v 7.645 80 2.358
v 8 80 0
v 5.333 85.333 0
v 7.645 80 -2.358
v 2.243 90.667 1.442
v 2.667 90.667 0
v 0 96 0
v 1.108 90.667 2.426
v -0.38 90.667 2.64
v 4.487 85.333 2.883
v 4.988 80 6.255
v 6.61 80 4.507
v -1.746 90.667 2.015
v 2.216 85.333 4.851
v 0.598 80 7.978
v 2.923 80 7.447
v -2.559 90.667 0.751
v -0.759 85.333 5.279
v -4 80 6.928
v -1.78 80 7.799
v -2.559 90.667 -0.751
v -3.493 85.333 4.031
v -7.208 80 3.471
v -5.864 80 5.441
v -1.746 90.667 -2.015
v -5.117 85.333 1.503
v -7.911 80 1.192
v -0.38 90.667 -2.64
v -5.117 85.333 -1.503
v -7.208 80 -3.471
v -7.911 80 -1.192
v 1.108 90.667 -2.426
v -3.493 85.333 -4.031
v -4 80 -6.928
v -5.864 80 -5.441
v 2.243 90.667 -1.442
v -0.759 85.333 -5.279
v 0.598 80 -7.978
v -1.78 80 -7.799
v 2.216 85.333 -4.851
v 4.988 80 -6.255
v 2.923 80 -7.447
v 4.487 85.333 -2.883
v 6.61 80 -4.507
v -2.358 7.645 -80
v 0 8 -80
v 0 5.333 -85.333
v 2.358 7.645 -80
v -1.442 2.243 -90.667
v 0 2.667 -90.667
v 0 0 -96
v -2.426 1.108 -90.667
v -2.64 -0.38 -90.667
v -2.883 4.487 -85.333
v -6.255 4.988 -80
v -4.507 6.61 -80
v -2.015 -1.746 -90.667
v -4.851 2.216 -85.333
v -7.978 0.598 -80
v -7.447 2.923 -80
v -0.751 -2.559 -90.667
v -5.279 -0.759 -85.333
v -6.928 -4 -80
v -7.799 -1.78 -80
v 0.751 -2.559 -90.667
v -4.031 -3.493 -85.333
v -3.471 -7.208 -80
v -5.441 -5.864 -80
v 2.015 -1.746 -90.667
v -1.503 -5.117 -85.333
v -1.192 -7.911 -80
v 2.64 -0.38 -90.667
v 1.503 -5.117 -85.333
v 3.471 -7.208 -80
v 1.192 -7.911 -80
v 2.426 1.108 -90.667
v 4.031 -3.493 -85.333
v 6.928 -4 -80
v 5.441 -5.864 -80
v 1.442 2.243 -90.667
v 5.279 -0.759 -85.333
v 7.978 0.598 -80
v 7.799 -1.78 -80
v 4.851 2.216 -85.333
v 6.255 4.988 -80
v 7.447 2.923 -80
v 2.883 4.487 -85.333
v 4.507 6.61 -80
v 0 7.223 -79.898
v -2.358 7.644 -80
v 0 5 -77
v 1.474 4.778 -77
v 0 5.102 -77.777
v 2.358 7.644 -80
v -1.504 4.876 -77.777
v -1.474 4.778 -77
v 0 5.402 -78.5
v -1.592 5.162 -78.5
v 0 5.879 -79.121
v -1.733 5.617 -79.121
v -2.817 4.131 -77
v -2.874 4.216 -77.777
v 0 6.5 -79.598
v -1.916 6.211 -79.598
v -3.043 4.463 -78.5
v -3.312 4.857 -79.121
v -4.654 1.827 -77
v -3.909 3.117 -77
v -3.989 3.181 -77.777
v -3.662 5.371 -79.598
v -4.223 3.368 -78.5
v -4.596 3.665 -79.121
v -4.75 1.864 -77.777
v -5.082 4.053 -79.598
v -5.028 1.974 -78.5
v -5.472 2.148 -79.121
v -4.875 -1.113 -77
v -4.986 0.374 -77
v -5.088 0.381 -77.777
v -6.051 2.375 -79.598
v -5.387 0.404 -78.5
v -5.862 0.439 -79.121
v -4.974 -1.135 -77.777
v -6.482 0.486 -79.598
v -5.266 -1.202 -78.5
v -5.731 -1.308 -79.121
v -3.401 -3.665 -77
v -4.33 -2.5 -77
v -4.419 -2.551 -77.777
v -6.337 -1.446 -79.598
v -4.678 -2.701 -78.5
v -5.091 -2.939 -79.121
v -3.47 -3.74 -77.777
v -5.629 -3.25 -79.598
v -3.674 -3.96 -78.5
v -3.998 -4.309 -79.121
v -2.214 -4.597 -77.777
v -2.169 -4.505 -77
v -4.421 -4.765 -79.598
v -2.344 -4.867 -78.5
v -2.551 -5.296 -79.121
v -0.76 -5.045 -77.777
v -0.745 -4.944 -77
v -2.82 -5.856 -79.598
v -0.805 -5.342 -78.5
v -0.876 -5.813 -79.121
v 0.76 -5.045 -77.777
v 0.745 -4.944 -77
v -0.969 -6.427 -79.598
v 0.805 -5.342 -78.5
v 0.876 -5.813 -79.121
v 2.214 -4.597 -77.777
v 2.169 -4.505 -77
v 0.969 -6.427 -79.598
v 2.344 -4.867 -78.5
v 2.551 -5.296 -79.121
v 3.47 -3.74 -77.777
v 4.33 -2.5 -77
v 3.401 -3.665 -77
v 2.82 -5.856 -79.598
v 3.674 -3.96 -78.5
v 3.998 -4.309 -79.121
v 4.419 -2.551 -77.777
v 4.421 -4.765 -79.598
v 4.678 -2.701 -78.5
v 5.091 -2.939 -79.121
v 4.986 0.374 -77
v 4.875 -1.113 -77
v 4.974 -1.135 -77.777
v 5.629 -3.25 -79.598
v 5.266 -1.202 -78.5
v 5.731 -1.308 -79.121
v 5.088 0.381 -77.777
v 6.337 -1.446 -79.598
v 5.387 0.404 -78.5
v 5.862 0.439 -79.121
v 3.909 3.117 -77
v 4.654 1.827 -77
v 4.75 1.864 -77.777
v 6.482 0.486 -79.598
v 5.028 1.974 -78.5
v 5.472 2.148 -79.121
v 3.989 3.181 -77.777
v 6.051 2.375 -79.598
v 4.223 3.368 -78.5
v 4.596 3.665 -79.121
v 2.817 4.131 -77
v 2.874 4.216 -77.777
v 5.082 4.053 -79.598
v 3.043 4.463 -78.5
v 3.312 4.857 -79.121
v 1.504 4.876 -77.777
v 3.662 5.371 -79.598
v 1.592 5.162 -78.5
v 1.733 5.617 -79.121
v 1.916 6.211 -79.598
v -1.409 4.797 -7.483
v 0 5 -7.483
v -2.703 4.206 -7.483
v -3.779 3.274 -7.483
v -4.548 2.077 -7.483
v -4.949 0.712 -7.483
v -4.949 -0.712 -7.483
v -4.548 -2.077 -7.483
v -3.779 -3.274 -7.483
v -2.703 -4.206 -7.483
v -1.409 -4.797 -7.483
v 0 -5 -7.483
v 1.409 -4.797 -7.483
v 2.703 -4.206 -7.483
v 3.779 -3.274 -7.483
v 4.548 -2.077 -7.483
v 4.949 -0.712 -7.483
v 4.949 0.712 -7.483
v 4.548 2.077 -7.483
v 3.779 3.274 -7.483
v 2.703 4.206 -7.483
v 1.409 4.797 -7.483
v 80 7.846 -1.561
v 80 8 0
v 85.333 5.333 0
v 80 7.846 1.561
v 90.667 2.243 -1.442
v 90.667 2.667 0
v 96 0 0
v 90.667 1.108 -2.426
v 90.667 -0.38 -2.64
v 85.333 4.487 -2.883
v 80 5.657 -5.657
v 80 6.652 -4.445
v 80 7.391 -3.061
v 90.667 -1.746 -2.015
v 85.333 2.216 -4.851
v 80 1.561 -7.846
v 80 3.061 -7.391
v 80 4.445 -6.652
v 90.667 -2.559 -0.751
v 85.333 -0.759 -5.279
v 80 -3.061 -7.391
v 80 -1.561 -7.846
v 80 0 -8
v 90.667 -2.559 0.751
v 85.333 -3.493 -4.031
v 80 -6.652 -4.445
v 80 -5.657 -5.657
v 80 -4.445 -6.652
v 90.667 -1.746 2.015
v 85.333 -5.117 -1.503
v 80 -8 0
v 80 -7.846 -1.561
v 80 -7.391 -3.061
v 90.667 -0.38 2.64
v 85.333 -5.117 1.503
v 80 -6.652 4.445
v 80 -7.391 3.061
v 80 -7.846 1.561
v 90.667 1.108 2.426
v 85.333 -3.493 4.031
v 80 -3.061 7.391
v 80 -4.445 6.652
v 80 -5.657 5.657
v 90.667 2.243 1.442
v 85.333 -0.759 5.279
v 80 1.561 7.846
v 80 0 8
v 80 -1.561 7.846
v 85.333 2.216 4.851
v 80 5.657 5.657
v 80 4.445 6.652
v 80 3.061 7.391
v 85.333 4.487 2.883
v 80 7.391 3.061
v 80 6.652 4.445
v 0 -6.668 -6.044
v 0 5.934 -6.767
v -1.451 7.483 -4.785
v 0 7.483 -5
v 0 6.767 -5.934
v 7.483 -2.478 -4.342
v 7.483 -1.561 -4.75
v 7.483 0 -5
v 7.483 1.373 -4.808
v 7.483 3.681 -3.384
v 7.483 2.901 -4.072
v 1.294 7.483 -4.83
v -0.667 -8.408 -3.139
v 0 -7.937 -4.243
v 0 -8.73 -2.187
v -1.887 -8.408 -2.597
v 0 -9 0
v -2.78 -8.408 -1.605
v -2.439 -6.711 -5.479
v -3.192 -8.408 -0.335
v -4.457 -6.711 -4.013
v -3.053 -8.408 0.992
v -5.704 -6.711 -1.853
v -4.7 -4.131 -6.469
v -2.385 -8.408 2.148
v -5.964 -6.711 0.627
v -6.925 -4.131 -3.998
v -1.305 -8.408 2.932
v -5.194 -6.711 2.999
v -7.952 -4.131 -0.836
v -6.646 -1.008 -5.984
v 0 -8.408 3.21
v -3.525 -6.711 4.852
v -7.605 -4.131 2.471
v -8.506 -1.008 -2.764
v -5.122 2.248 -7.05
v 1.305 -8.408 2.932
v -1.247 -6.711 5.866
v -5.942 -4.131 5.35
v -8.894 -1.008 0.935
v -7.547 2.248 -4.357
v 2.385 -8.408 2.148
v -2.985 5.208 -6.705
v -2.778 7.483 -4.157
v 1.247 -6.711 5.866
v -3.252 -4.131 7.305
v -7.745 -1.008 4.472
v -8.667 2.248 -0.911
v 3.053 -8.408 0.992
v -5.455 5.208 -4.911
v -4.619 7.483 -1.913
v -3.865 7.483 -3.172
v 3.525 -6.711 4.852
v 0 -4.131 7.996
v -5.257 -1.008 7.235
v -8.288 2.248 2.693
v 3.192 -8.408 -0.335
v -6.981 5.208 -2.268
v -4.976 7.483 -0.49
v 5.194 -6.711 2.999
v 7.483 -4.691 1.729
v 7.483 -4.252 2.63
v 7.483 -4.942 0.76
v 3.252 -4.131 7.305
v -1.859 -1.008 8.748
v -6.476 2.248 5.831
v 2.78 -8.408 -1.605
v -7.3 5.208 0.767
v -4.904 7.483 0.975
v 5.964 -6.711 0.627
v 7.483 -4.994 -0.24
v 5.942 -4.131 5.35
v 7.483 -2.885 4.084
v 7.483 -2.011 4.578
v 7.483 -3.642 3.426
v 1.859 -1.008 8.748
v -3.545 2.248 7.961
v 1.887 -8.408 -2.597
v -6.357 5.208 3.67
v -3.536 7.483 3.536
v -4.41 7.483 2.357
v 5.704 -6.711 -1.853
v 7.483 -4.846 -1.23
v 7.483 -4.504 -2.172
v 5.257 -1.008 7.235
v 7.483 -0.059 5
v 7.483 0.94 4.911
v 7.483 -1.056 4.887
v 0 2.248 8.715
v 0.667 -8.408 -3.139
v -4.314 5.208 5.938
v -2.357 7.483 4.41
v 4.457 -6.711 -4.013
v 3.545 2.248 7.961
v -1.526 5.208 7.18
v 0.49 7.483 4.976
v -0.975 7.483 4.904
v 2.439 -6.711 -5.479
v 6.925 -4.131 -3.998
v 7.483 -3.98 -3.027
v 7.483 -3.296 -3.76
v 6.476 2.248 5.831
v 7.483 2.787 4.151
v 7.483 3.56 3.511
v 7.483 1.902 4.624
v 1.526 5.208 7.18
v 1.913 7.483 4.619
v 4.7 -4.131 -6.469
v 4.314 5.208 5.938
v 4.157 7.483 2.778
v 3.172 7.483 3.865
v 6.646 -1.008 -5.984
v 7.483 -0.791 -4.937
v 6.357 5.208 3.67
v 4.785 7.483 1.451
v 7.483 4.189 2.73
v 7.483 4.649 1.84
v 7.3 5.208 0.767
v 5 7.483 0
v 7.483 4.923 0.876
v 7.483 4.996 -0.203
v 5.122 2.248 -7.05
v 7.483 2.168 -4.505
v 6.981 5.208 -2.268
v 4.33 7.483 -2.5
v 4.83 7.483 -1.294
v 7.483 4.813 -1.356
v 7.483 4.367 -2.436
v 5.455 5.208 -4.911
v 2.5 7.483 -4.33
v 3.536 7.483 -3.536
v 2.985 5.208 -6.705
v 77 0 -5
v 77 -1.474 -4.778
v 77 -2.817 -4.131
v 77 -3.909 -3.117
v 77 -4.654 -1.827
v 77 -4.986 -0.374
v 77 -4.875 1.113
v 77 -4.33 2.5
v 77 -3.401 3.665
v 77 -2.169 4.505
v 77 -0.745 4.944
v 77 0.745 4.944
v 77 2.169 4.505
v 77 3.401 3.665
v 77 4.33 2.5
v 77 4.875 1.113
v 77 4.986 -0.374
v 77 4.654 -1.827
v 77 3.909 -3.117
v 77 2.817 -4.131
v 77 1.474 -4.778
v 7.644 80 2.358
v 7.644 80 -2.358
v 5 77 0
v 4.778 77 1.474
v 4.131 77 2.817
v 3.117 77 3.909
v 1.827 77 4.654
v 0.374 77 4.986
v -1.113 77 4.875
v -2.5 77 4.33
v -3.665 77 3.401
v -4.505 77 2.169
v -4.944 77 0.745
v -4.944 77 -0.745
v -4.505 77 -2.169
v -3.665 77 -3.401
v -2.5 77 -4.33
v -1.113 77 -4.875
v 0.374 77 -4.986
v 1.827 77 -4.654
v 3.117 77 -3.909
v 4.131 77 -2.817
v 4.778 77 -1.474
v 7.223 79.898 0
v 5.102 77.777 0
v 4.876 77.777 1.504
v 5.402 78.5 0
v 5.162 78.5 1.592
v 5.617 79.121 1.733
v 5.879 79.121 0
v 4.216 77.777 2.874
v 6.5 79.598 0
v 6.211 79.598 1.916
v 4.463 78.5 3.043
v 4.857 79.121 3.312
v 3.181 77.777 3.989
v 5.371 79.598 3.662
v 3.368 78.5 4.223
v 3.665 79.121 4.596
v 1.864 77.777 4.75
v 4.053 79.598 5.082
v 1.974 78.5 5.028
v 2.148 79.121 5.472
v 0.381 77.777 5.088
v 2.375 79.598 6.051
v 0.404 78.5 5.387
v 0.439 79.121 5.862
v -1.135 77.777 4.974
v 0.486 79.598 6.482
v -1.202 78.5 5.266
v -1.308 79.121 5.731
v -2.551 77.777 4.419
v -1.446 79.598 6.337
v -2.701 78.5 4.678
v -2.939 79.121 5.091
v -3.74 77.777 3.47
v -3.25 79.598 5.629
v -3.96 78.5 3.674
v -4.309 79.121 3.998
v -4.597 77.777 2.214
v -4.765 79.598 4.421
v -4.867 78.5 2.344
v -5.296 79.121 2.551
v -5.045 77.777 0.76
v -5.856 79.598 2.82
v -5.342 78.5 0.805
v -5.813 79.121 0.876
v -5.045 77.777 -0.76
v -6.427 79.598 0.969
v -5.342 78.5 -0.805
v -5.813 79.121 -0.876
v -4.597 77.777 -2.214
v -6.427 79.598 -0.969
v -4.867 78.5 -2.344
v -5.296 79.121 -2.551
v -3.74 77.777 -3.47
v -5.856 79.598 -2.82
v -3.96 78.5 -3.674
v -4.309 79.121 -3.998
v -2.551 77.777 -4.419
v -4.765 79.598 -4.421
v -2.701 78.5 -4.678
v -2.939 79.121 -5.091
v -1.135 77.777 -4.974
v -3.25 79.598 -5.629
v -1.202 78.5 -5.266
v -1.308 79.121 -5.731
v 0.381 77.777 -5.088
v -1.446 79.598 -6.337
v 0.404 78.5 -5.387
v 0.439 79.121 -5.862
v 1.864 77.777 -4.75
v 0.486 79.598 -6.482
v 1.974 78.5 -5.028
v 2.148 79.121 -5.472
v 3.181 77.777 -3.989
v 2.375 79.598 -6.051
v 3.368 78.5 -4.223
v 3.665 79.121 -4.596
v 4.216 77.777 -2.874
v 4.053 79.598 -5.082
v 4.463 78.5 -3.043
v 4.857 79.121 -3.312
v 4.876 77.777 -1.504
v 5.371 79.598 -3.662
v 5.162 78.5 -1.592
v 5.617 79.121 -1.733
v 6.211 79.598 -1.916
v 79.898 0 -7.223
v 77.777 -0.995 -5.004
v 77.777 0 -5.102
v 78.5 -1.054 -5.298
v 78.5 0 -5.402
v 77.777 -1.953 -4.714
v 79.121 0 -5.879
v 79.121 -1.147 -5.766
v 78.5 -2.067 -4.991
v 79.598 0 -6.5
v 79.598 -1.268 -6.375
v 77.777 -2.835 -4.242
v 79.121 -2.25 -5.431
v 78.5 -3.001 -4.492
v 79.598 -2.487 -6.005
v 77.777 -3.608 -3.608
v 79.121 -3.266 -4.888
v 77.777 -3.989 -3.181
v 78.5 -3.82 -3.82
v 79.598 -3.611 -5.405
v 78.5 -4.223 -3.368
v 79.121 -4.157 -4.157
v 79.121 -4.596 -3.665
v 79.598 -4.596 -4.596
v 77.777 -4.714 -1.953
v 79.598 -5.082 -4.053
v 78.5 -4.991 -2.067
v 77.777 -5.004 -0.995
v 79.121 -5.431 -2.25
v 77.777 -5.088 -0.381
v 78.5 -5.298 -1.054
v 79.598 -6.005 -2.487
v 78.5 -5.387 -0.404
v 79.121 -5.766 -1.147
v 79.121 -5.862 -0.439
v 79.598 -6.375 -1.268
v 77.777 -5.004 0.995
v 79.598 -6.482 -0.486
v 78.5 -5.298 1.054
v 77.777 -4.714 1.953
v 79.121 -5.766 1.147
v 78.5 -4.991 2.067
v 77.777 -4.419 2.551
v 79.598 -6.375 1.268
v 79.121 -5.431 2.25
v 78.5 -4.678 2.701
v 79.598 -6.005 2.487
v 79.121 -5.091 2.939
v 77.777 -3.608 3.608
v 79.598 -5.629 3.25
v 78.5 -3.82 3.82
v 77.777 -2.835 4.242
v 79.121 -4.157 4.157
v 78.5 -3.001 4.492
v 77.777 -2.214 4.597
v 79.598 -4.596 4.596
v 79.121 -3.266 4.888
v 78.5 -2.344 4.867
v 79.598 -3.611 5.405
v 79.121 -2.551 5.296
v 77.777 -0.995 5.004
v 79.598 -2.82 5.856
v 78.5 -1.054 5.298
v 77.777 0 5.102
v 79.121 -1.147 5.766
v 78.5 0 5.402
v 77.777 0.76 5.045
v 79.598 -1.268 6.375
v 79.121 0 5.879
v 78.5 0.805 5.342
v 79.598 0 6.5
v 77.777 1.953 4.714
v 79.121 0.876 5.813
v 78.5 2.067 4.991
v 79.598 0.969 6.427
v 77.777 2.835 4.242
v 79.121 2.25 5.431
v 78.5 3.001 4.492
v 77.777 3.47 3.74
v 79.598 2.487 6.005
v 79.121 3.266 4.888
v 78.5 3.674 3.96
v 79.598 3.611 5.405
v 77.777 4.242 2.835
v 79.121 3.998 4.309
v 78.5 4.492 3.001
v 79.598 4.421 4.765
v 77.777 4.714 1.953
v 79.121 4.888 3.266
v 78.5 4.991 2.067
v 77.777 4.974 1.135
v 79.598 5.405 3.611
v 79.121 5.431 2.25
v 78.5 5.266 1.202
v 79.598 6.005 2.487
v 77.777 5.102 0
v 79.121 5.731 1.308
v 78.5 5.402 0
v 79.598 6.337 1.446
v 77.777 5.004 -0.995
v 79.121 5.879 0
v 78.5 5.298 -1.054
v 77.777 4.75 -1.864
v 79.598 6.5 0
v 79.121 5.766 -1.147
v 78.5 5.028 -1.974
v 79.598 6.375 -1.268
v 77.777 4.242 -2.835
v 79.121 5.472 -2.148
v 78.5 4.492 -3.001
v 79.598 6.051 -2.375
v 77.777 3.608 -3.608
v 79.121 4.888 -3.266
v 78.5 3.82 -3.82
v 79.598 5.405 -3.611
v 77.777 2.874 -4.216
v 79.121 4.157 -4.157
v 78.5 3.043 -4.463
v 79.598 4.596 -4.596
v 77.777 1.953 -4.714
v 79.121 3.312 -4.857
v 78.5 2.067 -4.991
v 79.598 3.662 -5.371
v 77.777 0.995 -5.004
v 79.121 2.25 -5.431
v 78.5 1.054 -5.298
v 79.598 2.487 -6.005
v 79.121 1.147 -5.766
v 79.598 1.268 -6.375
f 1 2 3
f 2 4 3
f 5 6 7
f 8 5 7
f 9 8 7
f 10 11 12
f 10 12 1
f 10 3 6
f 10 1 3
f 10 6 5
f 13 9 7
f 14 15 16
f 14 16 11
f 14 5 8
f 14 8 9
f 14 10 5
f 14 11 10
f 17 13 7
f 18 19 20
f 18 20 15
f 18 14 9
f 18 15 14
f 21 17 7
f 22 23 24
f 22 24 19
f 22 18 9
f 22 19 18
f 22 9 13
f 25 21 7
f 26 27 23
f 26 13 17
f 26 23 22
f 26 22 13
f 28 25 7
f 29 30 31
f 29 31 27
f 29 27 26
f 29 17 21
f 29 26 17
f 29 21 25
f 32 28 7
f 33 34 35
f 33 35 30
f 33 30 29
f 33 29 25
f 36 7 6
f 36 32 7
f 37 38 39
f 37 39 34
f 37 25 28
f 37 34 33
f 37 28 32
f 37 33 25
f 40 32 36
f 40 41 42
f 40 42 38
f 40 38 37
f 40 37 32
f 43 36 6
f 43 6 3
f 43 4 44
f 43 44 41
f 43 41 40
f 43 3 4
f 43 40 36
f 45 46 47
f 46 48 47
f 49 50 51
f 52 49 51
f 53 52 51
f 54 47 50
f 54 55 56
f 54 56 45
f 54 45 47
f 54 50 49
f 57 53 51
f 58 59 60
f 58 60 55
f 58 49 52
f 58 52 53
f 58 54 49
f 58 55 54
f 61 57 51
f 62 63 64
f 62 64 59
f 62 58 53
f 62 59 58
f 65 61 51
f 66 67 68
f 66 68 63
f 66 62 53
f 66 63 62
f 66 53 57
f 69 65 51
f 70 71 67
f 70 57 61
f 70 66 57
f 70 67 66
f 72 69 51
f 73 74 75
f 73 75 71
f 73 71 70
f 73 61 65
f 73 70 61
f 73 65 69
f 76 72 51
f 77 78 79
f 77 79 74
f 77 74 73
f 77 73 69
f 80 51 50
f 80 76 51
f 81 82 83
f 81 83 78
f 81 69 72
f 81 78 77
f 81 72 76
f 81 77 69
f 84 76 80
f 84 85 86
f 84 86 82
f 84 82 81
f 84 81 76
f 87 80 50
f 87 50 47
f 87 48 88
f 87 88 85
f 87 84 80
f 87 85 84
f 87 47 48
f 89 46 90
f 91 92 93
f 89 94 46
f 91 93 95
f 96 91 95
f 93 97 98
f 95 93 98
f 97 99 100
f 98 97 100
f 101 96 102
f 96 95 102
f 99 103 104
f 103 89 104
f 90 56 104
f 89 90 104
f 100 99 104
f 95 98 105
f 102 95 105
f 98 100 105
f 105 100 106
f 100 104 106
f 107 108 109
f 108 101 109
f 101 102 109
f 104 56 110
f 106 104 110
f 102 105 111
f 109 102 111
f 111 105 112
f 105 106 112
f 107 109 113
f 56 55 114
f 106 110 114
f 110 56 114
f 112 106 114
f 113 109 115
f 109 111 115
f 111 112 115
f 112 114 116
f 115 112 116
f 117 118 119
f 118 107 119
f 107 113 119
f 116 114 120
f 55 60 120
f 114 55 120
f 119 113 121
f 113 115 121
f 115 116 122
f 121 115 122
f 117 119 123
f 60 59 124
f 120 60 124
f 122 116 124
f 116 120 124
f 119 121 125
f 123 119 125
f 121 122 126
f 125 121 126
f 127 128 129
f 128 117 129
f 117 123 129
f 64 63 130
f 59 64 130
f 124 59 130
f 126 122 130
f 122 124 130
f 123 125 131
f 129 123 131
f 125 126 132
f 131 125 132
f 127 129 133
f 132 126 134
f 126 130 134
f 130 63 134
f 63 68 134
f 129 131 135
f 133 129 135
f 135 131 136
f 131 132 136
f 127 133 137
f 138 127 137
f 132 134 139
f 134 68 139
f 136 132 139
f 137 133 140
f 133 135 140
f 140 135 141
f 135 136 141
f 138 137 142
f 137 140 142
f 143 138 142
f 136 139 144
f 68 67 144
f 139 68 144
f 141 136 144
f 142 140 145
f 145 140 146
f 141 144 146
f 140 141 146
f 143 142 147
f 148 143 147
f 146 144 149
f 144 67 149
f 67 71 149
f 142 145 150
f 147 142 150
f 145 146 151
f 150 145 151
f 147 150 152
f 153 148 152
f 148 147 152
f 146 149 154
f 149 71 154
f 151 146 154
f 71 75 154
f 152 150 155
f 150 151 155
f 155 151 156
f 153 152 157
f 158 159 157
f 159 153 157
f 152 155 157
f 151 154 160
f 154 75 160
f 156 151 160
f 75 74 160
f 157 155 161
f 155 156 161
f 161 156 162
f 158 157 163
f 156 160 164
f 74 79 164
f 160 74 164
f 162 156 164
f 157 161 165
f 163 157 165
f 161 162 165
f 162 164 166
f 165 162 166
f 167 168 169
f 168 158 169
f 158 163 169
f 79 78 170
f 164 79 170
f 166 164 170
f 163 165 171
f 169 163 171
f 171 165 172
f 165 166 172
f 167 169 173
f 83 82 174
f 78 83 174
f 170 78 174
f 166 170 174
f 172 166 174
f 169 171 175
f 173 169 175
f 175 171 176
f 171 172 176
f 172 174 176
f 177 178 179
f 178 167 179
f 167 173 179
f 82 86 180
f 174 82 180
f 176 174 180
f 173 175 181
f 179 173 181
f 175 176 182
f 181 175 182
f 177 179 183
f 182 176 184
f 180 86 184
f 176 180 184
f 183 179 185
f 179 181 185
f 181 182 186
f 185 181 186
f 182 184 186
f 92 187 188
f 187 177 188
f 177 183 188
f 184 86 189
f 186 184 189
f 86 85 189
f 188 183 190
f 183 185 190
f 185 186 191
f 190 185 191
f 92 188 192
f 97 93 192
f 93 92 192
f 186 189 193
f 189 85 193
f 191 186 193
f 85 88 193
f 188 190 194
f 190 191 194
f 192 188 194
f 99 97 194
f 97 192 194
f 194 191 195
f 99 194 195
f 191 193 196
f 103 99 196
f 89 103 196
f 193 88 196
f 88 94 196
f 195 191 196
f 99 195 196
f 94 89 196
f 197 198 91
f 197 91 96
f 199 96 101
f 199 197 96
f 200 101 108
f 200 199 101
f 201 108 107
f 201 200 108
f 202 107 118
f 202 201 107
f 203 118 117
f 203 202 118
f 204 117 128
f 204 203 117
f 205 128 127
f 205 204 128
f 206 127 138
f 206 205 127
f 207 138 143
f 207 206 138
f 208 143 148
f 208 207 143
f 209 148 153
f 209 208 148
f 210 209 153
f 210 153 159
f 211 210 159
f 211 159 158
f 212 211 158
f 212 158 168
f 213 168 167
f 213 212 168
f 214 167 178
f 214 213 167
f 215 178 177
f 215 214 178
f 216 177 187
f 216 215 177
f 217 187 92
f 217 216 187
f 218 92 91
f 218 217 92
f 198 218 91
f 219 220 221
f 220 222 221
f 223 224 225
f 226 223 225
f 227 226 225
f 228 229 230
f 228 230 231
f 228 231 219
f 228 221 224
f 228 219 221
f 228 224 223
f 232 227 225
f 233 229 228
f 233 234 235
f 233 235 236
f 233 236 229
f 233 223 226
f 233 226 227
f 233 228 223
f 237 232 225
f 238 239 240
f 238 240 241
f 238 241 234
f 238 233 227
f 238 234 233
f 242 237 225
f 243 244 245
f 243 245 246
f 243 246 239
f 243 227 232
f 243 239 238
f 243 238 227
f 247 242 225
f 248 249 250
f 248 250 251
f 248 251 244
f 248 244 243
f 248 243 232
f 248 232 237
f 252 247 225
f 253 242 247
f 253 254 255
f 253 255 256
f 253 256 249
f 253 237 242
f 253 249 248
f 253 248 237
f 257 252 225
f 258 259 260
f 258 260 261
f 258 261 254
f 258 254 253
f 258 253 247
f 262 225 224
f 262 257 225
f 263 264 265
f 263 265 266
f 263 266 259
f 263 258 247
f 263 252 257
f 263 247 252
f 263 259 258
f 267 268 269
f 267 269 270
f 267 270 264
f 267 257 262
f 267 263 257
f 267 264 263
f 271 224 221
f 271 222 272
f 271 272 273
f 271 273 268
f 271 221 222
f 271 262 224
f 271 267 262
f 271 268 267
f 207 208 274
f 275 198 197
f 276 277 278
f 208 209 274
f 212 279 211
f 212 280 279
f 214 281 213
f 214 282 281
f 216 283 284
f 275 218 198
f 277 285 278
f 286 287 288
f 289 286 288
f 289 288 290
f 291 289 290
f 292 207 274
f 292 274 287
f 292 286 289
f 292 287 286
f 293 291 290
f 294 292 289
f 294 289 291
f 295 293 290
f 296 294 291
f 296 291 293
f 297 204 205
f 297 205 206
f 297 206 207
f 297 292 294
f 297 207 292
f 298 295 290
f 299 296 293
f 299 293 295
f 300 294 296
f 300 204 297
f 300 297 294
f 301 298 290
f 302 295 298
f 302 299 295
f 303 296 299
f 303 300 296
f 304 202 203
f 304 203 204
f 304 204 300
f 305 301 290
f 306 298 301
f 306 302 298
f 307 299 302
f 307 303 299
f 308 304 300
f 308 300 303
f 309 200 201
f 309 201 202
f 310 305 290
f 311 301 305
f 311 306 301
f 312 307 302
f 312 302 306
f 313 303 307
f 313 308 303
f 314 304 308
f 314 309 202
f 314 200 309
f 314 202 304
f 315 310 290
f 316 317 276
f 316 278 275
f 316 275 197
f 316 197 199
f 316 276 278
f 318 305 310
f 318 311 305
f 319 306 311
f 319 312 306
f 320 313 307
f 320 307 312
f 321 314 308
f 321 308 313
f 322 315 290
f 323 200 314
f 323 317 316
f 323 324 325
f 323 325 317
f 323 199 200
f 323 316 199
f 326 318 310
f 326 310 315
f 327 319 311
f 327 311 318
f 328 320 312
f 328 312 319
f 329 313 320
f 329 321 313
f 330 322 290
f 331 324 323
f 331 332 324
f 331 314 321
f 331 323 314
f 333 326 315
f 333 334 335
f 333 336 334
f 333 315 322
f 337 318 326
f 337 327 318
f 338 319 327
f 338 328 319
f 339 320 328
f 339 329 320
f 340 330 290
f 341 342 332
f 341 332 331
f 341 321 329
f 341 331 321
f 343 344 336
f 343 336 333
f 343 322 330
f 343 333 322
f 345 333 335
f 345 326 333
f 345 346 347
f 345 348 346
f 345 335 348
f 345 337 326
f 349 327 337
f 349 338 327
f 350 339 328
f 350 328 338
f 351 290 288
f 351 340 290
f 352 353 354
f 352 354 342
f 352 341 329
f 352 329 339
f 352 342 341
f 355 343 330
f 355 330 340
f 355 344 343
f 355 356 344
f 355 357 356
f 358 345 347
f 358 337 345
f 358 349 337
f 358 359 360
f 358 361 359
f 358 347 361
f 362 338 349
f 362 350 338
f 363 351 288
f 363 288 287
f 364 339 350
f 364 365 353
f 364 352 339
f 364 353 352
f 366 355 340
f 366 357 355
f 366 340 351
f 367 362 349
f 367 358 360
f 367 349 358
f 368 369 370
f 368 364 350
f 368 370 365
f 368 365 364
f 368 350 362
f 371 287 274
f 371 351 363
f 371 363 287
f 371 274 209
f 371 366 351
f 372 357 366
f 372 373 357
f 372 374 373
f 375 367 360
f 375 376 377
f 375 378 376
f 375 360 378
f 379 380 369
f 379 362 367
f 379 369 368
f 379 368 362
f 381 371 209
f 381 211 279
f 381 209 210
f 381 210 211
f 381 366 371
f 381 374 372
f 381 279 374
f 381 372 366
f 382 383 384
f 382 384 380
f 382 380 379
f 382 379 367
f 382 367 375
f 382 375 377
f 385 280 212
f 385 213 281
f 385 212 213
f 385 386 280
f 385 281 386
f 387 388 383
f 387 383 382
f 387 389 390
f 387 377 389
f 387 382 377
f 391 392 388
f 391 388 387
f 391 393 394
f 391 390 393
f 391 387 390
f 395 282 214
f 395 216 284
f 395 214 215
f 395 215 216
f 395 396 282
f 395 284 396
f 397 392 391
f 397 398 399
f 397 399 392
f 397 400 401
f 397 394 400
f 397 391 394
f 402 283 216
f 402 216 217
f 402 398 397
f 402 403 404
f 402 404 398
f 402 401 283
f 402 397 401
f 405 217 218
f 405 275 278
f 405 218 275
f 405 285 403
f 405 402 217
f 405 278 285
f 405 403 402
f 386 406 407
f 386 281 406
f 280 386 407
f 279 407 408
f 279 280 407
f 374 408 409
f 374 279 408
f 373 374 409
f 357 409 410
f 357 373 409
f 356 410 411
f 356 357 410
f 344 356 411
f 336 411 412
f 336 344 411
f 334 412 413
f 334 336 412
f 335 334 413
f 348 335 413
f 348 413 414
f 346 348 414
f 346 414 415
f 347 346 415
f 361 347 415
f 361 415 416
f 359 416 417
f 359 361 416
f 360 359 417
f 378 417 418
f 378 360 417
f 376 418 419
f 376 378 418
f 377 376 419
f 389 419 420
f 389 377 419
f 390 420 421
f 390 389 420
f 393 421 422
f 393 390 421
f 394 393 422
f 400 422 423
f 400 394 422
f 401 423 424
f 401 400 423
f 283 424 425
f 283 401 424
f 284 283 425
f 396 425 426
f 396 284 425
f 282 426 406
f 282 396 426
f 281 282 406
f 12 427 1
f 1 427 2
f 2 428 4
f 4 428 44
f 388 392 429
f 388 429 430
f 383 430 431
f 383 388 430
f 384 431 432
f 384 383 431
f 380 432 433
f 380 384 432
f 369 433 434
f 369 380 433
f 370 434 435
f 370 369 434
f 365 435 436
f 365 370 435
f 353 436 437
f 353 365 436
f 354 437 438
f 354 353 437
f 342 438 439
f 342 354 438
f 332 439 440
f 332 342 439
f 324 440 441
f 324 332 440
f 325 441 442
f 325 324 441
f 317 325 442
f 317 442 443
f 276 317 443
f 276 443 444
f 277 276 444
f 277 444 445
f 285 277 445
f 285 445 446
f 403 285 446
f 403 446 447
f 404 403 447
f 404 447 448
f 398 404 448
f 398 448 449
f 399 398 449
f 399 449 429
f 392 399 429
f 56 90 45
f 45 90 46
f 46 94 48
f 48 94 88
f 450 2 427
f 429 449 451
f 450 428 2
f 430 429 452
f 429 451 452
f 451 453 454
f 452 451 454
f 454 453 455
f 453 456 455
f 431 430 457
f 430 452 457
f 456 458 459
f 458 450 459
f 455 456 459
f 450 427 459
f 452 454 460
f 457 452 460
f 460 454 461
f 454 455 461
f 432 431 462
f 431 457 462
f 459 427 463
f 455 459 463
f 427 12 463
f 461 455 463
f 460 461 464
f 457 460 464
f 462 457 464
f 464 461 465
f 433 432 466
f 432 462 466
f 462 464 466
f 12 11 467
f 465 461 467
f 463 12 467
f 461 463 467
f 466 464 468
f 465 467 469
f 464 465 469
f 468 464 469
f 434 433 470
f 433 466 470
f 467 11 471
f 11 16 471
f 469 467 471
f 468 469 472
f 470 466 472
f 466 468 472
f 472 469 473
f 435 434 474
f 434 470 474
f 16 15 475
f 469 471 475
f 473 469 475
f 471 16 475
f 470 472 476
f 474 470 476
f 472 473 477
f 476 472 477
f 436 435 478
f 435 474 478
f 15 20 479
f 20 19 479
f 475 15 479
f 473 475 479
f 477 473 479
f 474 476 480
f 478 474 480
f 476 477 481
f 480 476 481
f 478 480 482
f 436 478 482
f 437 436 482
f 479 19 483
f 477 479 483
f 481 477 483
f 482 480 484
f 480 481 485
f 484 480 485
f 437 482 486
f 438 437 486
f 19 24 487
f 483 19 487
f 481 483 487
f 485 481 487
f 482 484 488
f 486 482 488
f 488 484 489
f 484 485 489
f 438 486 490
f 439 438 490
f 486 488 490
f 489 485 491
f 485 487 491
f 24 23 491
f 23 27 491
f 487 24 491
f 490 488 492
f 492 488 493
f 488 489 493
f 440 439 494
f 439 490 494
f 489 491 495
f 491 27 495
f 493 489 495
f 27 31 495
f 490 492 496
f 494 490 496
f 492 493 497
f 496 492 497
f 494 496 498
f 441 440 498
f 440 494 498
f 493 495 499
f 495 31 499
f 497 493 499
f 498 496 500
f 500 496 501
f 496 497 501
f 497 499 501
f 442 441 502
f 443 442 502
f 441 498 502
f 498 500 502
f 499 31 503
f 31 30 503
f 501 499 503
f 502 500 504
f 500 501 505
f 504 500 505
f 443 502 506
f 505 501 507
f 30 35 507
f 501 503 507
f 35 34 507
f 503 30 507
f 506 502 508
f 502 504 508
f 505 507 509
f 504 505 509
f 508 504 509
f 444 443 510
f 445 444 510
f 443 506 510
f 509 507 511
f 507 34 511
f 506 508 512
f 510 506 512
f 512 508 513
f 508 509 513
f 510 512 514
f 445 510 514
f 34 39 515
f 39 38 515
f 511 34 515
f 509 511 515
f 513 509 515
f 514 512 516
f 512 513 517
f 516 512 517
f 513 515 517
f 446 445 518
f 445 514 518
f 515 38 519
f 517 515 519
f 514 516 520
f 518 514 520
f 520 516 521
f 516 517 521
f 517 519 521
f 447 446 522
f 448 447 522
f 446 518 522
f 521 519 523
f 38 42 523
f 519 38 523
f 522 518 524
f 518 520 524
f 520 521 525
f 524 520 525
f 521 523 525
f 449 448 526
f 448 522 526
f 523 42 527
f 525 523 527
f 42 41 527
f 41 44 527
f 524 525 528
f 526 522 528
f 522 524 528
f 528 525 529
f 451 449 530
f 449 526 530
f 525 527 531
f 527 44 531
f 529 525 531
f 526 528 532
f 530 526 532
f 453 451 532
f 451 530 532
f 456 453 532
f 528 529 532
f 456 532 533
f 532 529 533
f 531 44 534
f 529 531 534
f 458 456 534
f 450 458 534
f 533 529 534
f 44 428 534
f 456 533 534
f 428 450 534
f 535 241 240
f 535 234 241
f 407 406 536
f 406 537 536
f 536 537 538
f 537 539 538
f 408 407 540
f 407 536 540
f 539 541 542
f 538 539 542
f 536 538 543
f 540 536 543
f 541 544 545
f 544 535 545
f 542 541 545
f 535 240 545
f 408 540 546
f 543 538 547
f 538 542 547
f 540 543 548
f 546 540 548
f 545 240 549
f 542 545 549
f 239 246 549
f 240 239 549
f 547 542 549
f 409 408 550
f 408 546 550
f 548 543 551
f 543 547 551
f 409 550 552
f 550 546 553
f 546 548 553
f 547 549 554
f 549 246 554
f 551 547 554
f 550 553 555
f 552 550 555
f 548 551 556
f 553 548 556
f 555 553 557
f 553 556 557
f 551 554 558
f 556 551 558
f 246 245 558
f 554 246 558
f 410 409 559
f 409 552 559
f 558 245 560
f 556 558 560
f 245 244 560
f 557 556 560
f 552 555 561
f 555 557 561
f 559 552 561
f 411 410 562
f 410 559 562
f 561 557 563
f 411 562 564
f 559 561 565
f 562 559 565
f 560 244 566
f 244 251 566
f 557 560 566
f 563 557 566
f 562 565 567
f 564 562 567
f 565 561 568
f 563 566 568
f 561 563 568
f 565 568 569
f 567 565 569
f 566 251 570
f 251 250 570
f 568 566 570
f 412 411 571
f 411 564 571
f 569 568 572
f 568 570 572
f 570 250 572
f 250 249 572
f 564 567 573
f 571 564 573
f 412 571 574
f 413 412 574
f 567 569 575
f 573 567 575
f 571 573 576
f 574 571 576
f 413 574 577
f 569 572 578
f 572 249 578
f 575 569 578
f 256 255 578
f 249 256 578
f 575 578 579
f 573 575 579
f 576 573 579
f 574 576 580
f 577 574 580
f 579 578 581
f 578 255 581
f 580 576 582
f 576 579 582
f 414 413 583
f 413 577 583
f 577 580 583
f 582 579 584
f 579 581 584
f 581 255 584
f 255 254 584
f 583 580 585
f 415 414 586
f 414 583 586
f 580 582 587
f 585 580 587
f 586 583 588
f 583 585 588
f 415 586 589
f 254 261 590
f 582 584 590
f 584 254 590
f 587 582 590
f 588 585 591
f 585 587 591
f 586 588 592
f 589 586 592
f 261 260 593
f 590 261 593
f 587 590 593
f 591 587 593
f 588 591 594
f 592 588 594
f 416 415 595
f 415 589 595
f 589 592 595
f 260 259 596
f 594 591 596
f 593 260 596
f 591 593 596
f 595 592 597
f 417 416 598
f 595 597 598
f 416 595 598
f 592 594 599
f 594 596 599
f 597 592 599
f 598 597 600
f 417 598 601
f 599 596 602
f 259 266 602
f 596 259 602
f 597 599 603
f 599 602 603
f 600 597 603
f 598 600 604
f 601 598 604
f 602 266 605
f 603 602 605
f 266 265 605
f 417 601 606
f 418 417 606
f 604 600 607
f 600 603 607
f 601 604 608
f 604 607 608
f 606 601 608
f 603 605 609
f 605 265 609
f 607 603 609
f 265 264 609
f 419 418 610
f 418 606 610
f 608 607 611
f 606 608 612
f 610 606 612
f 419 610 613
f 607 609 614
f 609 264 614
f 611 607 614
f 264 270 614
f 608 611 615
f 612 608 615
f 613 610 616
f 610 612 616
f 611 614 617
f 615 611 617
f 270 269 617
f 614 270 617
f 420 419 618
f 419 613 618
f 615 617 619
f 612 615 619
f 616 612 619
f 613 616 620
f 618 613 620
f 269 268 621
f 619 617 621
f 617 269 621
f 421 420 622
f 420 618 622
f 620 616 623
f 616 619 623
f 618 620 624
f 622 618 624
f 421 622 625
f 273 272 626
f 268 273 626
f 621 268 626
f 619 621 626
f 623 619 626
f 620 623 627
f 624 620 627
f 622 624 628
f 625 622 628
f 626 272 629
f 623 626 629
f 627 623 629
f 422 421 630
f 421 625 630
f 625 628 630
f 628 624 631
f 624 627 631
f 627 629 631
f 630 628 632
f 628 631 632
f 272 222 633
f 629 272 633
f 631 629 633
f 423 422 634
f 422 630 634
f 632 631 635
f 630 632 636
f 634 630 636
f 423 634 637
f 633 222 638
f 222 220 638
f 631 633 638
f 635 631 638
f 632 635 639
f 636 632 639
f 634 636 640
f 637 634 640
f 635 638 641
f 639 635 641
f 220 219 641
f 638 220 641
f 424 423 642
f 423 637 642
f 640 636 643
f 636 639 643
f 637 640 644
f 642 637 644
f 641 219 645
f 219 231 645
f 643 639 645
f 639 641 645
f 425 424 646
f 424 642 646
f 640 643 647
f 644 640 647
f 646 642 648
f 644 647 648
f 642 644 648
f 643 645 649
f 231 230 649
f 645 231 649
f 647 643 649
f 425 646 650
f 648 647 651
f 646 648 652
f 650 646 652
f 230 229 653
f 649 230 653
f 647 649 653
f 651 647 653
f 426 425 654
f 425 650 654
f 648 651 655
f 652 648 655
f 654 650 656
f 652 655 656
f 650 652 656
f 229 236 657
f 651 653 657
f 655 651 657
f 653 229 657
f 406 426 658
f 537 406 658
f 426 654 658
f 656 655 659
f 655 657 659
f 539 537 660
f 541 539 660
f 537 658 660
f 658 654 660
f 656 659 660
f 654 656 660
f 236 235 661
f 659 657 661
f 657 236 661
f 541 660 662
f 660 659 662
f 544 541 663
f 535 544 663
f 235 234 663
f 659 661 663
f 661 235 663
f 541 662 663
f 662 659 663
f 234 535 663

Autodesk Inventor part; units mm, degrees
ref_plane "YZ Plane" through (0, 0, 0) normal (1, 0, 0) x (0, 1, 0)
ref_plane "XZ Plane" through (0, 0, 0) normal (0, 1, 0) x (-1, 0, 0)
ref_plane "XY Plane" through (0, 0, 0) normal (0, 0, 1) x (1, 0, 0)
sketch "Schizzo1" plane through (0, 0, 0) normal (0, 1, 0) x (-1, 0, 0)
  line L0 (1.5, 0) -> (-1.5, 0)
  arc A0 (1.5, 0) -> (-1.5, 0) centre (0, 0) ccw
  dimension "d11" = 3
revolve "Rivoluzione1" add sketch "Schizzo1" angle 360 about axis through (-1.5, 0, 0) along (1, 0, 0)
sketch "Schizzo3" plane through (0, 0, 0) normal (0, 0, -1) x (0, 1, 0)
  circle A0 centre (0, 0) radius 5
  dimension "d19" = 10
extrude "Estrusione2" add sketch "Schizzo3" along normal blind 80
sketch "Schizzo4" plane through (0, 0, 0) normal (1, 0, 0) x (0, 0, -1)
  circle A0 centre (0, 0) radius 5
  dimension "d22" = 10
extrude "Estrusione3" add sketch "Schizzo4" along normal blind 80
sketch "Schizzo5" plane through (0, 0, 0) normal (0, 1, 0) x (1, 0, 0)
  line L0 (0, -5) -> (0, 0) projected
  circle A0 centre (0, 0) radius 5
  dimension "d25" = 10
extrude "Estrusione4" add sketch "Schizzo5" along normal blind 80
sketch "Schizzo6" plane through (0, 0, 0) normal (1, 0, 0) x (0, 0, -1)
  line L0 (0, -9) -> (0, 9)
  line L1 (0, 0) -> (-5, 0) projected
  arc A0 (0, -9) -> (0, 9) centre (0, 0) ccw
  dimension "d28" = 18
revolve "Rivoluzione3" add sketch "Schizzo6" angle 360 about axis through (0, -9, 0) along (0, 1, 0)
sketch "Schizzo7" plane through (0, 0, 0) normal (0, 0, -1) x (0, 1, 0)
  line L0 (7.4833, -5) -> (7.4833, 5) projected
  line L1 (80, -5) -> (80, 5) projected
  line L2 (5, 7.4833) -> (-5, 7.4833) projected
  line L3 (5, 80) -> (-5, 80) projected
  line L4 (0, 0) -> (80, 0)
  line L5 (80, 0) -> (80, 8)
  line L6 (80, -5) -> (80, 5) projected
  line L7 (80, 0) -> (88, 0) construction
  line L8 (80, 0) -> (96, 0)
  line L9 (80, 0) -> (96, 0) construction
  line L10 (96, 0) -> (80, 8)
  point P0 (96, 0)
  dimension "d30" = 8
  dimension "d31" = 90
  dimension "d32" = 16
  dimension "d33" = 0
revolve "Rivoluzione4" add sketch "Schizzo7" angle 360 about axis through (0, 80, 0) along (0, 1, 0)
sketch "Schizzo8" plane through (0, 0, 0) normal (1, 0, 0) x (0, 0, -1)
  line L0 (0, 0) -> (80, 0)
  line L1 (7.4833, -5) -> (7.4833, 5) projected
  line L2 (80, -5) -> (80, 5) projected
  line L3 (80, 0) -> (80, 8)
  line L4 (80, -5) -> (80, 5) projected
  line L5 (80, 0) -> (88, 0) construction
  line L6 (80, 0) -> (96, 0)
  line L7 (80, 0) -> (96, 0) construction
  line L8 (96, 0) -> (80, 8)
  dimension "d35" = 8
  dimension "d36" = 90
  dimension "d37" = 16
  dimension "d38" = 0
revolve "Rivoluzione5" add sketch "Schizzo8" angle 360 about axis through (0, 0, -80) along (0, 0, -1)
sketch "Schizzo9" plane through (0, 0, 0) normal (0, 0, -1) x (0, 1, 0)
  line L0 (5, 7.4833) -> (-5, 7.4833) projected
  line L1 (5, 80) -> (-5, 80) projected
  circle A0 centre (0, 0) radius 8 projected
  line L2 (0, 0) -> (0, 80)
  line L3 (0, 80) -> (8, 80)
  line L4 (5, 80) -> (-5, 80) projected
  line L5 (0, 80) -> (8, 80) construction
  line L6 (0, 80) -> (0, 96)
  line L7 (0, 80) -> (16, 80) construction
  line L8 (0, 96) -> (8, 80)
  dimension "d40" = 8
  dimension "d41" = 0
  dimension "d42" = 16
  dimension "d43" = 90
revolve "Rivoluzione6" add sketch "Schizzo9" angle 360 about axis through (80, 0, 0) along (1, 0, 0) contours L1 L6 L8 L3
fillet "Raccordo1" radius 3 1 edges at (0, -5, -80)
fillet "Raccordo2" radius 3 1 edges at (-5, 80, 0)
fillet "Raccordo3" radius 3 1 edges at (80, 0, 5)
ref_plane "PianoY" through (0, 0, -96) normal (0, 0, -1) x (-1, 0, 0)
ref_plane "PianoX" through (96, 0, 0) normal (-1, 0, 0) x (0, -1, 0)
ref_plane "PianoZ" through (0, 96, 0) normal (0, 1, 0) x (-1, 0, 0)
properties part number "0_Sistemariferimento"
